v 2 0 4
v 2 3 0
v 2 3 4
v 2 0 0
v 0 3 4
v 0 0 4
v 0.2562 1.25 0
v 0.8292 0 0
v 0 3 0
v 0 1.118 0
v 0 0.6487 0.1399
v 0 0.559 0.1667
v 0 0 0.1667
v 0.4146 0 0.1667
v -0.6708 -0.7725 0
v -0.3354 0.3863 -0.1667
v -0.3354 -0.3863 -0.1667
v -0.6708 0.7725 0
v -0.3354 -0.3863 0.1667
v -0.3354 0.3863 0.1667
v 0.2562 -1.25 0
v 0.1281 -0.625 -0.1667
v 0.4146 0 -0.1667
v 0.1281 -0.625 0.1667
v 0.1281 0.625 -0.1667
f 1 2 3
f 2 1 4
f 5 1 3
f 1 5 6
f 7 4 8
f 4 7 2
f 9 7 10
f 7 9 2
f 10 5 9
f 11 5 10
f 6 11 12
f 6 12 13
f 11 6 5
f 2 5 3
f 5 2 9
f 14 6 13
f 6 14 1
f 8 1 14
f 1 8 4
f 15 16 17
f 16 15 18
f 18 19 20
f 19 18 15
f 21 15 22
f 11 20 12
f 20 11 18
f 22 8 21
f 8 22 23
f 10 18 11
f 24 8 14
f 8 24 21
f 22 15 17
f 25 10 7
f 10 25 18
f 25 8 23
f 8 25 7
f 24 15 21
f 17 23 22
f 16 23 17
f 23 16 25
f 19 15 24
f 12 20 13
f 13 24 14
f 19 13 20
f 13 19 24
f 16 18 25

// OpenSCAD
resize([2, 3, 4]) cube();
resize([2, 0, 0], auto = true) cube();
resize(newsize = [2, 0, 0], auto = [true, false, true]) cube();
resize([2, 3]) square();
resize([1.5, 2.5, 1/3], convexity = 2) sphere();
